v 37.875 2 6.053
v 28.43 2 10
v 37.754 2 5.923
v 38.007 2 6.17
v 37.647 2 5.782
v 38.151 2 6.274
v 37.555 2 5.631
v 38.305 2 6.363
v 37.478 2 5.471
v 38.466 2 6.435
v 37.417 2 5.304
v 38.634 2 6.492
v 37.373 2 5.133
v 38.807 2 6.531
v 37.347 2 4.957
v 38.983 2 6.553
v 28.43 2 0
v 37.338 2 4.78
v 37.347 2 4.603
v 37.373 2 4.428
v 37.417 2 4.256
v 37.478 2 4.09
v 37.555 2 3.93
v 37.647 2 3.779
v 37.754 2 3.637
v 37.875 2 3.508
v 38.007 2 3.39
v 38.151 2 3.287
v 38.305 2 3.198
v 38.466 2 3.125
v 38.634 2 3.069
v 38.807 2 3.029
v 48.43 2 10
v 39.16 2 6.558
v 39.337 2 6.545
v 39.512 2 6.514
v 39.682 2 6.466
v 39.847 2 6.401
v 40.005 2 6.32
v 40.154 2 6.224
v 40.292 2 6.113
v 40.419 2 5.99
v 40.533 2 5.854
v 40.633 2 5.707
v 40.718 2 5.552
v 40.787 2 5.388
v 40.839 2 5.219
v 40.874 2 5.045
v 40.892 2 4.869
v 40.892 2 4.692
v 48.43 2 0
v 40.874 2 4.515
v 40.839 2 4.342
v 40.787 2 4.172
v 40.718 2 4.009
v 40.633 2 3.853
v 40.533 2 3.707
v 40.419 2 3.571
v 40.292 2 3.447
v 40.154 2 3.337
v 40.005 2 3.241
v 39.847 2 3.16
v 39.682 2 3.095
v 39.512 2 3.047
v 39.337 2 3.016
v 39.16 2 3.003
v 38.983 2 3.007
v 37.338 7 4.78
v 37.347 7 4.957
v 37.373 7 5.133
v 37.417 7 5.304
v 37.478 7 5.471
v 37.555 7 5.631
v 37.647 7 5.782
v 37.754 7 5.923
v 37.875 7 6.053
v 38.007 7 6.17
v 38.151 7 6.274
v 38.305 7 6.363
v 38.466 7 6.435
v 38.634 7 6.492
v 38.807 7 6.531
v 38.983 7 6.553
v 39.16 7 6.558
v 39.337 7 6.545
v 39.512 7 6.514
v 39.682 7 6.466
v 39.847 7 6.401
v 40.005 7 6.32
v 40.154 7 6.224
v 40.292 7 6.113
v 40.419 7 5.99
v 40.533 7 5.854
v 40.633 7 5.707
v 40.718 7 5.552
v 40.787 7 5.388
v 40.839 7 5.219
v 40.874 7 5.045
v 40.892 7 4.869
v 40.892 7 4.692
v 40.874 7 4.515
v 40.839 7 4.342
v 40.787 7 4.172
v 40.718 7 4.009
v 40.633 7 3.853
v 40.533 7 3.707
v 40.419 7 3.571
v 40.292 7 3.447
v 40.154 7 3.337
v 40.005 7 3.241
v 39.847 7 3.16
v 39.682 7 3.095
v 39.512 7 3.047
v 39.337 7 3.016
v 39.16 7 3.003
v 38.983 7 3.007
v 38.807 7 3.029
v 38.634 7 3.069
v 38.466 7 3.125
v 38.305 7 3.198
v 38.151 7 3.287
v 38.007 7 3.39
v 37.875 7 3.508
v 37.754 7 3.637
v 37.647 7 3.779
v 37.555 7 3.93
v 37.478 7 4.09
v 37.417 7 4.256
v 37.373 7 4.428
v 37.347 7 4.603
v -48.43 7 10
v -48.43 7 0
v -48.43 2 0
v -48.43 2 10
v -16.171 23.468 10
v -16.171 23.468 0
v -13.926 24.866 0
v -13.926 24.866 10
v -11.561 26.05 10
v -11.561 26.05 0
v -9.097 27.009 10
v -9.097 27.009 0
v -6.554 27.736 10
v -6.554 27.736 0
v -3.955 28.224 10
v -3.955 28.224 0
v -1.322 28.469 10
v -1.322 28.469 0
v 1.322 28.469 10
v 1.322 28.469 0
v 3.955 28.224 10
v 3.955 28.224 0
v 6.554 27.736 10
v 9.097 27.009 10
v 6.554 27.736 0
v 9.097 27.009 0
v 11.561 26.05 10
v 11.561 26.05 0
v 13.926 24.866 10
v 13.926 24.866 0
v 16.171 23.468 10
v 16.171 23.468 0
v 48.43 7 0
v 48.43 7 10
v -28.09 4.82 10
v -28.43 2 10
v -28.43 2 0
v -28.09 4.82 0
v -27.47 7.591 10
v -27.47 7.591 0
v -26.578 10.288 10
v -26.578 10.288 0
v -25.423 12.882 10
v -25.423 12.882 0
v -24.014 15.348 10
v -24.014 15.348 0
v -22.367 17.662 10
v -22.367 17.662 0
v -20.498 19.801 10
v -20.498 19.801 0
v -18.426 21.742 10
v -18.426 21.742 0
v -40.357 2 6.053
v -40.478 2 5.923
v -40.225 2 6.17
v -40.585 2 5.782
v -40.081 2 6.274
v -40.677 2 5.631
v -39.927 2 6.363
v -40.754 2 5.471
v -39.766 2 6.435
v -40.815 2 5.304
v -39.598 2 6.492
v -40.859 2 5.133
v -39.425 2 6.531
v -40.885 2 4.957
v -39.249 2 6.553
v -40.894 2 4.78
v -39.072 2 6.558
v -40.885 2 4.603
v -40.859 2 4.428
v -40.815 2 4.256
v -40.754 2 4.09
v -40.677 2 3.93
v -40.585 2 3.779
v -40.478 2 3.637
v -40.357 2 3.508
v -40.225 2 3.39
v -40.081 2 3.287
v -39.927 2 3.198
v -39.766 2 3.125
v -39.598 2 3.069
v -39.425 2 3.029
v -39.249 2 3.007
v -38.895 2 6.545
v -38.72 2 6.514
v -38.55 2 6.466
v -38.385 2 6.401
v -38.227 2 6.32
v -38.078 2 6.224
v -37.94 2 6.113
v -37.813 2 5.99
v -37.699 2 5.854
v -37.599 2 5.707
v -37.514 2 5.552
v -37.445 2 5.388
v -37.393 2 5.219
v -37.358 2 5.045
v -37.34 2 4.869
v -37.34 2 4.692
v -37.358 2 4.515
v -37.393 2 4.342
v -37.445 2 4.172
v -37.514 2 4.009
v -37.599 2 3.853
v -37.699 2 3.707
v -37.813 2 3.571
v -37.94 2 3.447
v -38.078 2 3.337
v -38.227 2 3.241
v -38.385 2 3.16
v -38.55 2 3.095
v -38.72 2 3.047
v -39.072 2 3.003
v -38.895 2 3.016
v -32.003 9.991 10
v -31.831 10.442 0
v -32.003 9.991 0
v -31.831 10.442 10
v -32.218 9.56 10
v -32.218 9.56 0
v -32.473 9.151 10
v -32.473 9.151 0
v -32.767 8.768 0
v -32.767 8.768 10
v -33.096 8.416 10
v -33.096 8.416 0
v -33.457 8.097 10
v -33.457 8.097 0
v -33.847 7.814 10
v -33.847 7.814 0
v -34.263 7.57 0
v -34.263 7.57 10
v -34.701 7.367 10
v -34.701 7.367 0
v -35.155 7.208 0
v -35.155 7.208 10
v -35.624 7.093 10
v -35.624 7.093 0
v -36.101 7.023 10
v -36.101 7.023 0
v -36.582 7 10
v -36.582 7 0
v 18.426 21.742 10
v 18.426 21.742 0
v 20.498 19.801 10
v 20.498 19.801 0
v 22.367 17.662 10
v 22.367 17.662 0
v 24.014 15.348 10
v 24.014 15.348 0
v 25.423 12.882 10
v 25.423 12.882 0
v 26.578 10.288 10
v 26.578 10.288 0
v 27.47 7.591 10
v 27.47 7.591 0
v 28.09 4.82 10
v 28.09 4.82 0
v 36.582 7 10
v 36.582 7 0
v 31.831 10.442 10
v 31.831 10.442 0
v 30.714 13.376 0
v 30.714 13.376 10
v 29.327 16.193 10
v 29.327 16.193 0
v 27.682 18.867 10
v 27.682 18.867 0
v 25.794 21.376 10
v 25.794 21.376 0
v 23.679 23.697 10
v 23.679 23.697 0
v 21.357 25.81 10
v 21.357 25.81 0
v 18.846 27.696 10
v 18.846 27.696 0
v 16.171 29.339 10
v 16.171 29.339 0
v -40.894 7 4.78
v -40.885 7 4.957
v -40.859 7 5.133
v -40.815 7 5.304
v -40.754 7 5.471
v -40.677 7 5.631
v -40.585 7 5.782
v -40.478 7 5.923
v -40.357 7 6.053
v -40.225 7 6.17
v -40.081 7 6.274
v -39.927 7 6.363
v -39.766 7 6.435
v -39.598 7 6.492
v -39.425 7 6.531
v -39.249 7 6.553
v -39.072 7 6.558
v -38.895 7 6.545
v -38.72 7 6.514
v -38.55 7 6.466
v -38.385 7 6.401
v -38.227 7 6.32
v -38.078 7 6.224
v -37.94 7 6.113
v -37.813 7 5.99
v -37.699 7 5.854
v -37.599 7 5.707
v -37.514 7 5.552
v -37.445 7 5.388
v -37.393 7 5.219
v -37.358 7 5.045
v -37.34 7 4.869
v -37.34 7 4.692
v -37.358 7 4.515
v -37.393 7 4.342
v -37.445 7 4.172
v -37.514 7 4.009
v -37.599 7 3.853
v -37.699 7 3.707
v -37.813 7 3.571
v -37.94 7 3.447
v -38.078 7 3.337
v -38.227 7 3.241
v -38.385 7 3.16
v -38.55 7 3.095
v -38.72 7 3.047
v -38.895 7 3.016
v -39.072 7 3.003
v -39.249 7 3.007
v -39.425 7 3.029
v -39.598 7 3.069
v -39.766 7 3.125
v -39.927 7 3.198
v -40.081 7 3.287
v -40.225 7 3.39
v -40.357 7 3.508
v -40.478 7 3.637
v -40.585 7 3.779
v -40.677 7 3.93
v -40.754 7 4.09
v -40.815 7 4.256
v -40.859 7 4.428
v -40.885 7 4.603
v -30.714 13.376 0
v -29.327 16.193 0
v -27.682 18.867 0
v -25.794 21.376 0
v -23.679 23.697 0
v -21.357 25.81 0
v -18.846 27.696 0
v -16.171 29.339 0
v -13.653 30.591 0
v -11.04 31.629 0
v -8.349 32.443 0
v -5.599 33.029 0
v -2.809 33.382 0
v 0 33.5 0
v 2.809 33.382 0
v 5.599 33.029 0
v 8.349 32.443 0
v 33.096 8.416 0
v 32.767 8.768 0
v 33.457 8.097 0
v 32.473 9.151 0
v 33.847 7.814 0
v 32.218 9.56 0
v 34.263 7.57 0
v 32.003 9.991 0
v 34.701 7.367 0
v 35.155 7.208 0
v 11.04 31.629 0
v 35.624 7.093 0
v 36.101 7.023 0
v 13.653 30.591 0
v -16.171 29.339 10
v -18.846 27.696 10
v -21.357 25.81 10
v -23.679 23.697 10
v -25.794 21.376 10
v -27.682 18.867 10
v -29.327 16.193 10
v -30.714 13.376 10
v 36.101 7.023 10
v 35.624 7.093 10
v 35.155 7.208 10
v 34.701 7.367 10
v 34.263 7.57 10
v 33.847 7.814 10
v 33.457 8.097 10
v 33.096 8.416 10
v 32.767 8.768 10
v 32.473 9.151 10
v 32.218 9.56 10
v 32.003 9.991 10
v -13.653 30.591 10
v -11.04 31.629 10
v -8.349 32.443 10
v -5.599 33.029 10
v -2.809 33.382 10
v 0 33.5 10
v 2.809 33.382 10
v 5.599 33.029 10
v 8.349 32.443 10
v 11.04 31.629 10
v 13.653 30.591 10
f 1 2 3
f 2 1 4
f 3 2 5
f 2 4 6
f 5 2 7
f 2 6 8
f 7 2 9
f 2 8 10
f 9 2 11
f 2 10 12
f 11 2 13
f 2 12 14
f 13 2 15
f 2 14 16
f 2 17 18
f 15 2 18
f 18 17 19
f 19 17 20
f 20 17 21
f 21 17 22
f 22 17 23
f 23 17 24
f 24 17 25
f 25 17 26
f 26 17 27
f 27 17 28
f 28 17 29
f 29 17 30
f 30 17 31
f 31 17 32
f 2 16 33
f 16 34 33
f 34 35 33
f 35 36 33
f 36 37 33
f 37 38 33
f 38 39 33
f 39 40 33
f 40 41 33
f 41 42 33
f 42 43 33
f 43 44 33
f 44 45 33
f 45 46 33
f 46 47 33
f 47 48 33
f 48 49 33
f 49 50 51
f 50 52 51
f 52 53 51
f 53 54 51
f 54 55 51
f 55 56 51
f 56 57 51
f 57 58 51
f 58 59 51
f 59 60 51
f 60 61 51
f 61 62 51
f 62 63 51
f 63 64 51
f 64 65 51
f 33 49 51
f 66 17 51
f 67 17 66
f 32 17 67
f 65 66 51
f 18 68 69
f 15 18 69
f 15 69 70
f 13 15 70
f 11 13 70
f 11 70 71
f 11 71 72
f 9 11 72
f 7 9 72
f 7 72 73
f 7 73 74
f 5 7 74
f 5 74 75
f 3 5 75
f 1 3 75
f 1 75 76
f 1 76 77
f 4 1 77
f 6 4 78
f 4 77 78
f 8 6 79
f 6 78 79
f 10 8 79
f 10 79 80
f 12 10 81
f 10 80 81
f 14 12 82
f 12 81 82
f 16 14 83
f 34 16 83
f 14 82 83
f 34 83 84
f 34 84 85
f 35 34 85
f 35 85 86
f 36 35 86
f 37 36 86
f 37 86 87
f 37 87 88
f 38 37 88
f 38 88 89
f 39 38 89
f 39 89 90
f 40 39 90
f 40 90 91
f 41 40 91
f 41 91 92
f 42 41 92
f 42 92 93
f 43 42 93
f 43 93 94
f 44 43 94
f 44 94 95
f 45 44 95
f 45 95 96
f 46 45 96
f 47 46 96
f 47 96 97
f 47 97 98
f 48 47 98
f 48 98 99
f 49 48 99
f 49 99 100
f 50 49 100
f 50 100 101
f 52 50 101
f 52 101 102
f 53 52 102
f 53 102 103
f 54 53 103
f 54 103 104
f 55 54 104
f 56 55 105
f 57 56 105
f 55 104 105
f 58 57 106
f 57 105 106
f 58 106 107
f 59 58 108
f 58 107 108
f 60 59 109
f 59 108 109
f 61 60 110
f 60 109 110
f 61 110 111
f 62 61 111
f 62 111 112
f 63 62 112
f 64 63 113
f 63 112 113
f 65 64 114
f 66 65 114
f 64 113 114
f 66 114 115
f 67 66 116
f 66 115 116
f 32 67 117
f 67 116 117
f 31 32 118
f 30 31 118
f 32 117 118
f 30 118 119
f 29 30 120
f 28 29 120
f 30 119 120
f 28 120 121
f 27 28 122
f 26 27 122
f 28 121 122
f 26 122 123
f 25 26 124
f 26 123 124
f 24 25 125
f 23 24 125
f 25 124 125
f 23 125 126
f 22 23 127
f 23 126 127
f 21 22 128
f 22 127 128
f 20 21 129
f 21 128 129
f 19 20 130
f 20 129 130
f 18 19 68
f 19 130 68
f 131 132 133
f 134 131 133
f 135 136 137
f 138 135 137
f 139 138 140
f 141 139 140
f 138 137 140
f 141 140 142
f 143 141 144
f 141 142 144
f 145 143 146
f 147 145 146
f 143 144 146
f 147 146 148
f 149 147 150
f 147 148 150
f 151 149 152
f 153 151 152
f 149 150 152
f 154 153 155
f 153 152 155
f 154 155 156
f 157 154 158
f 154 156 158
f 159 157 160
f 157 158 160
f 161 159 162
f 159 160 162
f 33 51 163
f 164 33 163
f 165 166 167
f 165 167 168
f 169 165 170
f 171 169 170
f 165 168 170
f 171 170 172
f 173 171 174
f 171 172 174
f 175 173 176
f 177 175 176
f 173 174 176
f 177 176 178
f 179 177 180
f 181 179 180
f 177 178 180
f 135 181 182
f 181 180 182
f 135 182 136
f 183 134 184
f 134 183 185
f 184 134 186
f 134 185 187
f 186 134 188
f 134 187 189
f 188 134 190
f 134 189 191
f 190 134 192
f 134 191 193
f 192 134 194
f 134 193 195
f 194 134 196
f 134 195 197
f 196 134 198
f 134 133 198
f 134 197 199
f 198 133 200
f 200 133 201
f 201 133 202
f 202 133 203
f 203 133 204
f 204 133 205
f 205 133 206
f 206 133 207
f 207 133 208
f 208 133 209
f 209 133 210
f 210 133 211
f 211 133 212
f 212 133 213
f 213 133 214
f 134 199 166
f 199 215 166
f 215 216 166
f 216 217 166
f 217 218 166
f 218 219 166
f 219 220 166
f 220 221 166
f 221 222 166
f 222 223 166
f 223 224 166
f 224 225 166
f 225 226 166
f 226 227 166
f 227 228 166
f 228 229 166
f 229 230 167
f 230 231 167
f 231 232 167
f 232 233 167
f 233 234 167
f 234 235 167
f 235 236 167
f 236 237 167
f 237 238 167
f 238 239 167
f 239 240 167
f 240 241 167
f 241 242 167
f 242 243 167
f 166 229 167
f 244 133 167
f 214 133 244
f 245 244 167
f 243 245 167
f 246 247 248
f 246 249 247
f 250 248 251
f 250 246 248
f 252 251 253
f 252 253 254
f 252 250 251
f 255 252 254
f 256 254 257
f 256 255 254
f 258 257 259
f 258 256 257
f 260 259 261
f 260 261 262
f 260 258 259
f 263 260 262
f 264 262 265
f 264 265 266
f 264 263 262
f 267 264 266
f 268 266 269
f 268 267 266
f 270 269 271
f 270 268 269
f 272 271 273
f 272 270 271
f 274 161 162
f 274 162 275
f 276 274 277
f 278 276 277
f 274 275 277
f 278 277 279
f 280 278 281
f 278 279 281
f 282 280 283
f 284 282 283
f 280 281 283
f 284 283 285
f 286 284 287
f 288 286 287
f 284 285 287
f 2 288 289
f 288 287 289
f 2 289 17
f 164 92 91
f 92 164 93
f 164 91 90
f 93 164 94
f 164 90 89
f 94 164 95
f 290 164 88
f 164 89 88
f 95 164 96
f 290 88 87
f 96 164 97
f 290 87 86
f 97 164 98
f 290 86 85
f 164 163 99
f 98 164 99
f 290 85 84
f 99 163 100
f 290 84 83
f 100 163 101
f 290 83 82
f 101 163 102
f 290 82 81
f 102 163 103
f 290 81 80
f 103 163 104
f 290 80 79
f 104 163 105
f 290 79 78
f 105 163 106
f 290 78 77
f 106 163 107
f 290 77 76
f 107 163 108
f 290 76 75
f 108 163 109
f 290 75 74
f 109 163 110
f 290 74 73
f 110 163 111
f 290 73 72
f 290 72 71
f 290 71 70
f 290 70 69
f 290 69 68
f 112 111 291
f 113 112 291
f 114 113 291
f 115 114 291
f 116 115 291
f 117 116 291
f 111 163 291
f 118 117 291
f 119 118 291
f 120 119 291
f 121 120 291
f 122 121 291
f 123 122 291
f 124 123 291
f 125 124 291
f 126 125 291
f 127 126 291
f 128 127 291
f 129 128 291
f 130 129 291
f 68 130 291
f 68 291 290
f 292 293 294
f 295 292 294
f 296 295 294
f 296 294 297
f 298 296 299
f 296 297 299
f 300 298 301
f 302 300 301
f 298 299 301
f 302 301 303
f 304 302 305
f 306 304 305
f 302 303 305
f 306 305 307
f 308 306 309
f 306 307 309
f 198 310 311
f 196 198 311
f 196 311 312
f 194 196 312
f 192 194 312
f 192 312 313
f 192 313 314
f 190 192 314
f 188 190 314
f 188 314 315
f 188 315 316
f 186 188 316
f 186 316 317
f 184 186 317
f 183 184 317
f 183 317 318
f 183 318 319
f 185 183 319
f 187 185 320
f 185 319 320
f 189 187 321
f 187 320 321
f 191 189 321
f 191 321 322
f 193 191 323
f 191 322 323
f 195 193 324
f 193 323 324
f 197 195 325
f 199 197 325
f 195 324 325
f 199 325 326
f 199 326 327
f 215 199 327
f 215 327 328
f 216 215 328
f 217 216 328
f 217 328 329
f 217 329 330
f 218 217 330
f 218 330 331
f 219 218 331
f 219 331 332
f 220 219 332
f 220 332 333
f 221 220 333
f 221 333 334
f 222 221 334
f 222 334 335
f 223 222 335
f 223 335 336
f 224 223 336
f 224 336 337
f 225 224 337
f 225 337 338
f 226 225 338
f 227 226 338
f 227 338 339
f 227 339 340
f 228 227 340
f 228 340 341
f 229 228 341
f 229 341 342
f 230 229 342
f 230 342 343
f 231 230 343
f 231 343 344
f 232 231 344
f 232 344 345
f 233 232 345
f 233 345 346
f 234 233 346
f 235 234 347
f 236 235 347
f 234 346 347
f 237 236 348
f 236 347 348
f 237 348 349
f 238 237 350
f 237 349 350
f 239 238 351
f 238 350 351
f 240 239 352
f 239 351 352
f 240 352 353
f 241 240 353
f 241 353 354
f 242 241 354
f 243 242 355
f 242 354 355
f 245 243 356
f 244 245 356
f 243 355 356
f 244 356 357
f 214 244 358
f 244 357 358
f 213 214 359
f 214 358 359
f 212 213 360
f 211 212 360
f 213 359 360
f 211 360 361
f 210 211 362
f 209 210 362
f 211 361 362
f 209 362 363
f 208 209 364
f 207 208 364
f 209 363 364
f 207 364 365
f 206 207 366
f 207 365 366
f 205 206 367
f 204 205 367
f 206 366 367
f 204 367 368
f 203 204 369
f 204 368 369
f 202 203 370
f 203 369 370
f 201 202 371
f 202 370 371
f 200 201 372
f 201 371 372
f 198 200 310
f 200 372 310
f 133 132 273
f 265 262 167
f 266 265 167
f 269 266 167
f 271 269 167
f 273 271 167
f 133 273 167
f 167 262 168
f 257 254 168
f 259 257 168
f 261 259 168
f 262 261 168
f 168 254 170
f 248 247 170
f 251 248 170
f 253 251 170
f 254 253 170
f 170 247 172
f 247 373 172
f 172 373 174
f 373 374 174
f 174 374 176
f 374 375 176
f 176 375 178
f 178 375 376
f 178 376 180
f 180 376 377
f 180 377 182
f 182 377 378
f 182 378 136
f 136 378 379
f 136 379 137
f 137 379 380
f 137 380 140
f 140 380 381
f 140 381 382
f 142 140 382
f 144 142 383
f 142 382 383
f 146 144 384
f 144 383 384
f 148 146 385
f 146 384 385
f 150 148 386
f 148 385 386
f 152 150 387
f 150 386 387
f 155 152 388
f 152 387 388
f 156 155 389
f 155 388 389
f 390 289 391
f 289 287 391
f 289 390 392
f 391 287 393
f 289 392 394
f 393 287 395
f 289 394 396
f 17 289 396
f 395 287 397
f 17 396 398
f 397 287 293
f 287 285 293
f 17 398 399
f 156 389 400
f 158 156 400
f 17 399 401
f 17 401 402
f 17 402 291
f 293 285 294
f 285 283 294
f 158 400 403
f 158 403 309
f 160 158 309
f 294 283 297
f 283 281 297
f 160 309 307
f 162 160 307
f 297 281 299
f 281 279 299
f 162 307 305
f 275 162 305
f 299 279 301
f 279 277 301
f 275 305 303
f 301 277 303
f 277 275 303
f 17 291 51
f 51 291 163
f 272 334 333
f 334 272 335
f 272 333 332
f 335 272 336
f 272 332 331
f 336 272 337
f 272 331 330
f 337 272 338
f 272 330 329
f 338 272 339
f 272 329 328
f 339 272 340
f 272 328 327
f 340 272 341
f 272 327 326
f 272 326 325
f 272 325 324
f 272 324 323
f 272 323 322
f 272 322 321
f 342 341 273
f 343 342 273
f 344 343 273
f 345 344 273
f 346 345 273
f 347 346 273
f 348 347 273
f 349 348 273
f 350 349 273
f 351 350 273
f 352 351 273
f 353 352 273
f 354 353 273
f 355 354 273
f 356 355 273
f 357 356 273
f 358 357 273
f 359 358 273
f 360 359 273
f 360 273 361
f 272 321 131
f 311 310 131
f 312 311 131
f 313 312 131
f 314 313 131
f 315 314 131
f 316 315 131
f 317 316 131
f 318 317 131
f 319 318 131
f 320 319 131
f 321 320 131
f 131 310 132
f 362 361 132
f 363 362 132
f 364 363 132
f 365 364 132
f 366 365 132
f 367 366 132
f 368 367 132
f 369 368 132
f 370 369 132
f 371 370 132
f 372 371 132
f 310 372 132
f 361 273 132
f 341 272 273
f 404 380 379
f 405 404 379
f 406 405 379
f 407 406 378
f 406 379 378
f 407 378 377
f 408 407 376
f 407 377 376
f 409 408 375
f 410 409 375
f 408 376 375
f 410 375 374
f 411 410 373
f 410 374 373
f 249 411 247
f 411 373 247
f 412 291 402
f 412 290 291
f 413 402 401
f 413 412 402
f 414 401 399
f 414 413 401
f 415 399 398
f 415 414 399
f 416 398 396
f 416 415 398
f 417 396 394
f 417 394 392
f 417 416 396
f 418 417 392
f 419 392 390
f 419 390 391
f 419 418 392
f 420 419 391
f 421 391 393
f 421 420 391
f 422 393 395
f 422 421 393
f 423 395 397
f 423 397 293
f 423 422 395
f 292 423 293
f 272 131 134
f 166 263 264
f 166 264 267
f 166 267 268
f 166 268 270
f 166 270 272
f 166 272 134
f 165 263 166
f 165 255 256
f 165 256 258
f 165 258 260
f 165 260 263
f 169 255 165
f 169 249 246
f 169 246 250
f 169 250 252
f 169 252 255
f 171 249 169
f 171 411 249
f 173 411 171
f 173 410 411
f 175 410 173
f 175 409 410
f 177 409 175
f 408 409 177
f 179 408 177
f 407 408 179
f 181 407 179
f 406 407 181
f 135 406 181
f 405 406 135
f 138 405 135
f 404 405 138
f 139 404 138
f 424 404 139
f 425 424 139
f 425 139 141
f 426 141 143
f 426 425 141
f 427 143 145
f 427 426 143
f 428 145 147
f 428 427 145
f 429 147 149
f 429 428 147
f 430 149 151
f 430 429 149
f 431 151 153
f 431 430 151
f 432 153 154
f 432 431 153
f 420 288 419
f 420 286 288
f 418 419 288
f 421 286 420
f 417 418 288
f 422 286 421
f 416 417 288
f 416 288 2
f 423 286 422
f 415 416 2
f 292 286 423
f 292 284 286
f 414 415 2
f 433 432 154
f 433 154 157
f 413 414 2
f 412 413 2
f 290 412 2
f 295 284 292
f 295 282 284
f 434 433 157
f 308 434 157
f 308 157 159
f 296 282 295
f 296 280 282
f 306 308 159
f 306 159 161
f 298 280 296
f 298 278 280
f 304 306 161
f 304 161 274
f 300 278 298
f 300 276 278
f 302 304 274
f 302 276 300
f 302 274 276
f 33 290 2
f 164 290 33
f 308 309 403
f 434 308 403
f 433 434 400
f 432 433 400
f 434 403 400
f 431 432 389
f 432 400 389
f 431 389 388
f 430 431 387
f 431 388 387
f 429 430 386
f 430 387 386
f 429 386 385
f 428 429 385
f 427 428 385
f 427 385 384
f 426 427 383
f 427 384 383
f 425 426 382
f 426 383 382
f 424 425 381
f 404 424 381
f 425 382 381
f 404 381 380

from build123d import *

# Parameters (mm, degrees)
F1_DEPTH = 10
F4_DEPTH = 10.001
F6_D     = 3.556
F7_R     = 5


# Not quite as in the source:
# - a feature of the source that left no trace in its solid (it failed there, or was rolled back) is left out
# - a feature names something its author has since deleted; it is built from what else it names


with BuildPart() as f1:
    # F0 (on Top) → F1 (new body)
    with BuildSketch(Plane.XY):
        with BuildLine():
            ThreePointArc((16.1705551086, 23.468343518), (24.7491207645, 14.1326225939), (28.4297379517, 2))
            Line((28.4297379517, 2), (28.4297379517, 7))
            Line((28.4297379517, 7), (32.7604945018, 7))
            ThreePointArc((32.7604945018, 7), (26.8945535829, 19.9733068763), (16.1705551086, 29.3387652685))
            Line((16.1705551086, 29.3387652685), (16.1705551086, 23.468343518))
        make_face()
        with BuildLine():
            ThreePointArc((-16.1705551086, 23.468343518), (0, 28.5), (16.1705551086, 23.468343518))
            Line((16.1705551086, 23.468343518), (16.1705551086, 29.3387652685))
            Line((16.1705551086, 29.3387652685), (-16.1705551086, 29.3387652685))
            Line((-16.1705551086, 29.3387652685), (-16.1705551086, 23.468343518))
        make_face()
        with BuildLine():
            ThreePointArc((-28.4297379517, 2), (-24.7491207645, 14.1326225939), (-16.1705551086, 23.468343518))
            Line((-16.1705551086, 23.468343518), (-16.1705551086, 29.3387652685))
            ThreePointArc((-16.1705551086, 29.3387652685), (-26.8945535829, 19.9733068763), (-32.7604945018, 7))
            Line((-32.7604945018, 7), (-28.4297379517, 7))
            Line((-28.4297379517, 7), (-28.4297379517, 2))
        make_face()
        with BuildLine():
            Line((-48.4297379517, 2), (-33.4402452144, 2))
            ThreePointArc((-33.4402452144, 2), (-33.1946454228, 4.5128167765), (-32.7604945018, 7))
            Line((-32.7604945018, 7), (-48.4297379517, 7))
            Line((-48.4297379517, 7), (-48.4297379517, 2))
        make_face()
        with BuildLine():
            Line((-33.4402452144, 2), (-28.4297379517, 2))
            Line((-28.4297379517, 2), (-28.4297379517, 7))
            Line((-28.4297379517, 7), (-32.7604945018, 7))
            ThreePointArc((-32.7604945018, 7), (-33.1946454228, 4.5128167765), (-33.4402452144, 2))
        make_face()
        with BuildLine():
            Line((28.4297379517, 7), (28.4297379517, 2))
            Line((28.4297379517, 2), (33.4402452144, 2))
            ThreePointArc((33.4402452144, 2), (33.1946454228, 4.5128167765), (32.7604945018, 7))
            Line((32.7604945018, 7), (28.4297379517, 7))
        make_face()
        with BuildLine():
            ThreePointArc((32.7604945018, 7), (33.1946454228, 4.5128167765), (33.4402452144, 2))
            Line((33.4402452144, 2), (48.4297379517, 2))
            Line((48.4297379517, 2), (48.4297379517, 7))
            Line((48.4297379517, 7), (32.7604945018, 7))
        make_face()
        with BuildLine():
            Line((-16.1705551086, 29.3387652685), (16.1705551086, 29.3387652685))
            ThreePointArc((16.1705551086, 29.3387652685), (8.3486935036, 32.4430164563), (1.811e-07, 33.5))
            ThreePointArc((1.811e-07, 33.5), (-8.3486933282, 32.4430165014), (-16.1705551086, 29.3387652685))
        make_face()
    extrude(amount=F1_DEPTH)

    # F0 (on Top) → F4 (cut, through all)
    with BuildSketch(Plane.XY):
        with BuildLine():
            Line((-16.1705551086, 23.468343518), (16.1705551086, 23.468343518))
            ThreePointArc((16.1705551086, 23.468343518), (0, 28.5), (-16.1705551086, 23.468343518))
        make_face()
    extrude(amount=F4_DEPTH, mode=Mode.SUBTRACT)

    # F6 (through all)
    with Locations(Plane.XZ.offset(-2)):
        with Locations((-39.116, 4.78035165), (39.116, 4.78035165)):
            Hole(F6_D / 2)

    # F7
    f7_edges = [f1.edges().sort_by_distance(p)[0] for p in [
        (-32.760495, 7, 5),
        (32.760495, 7, 5),
    ]]
    fillet(f7_edges, radius=F7_R)


solid = f1.part
